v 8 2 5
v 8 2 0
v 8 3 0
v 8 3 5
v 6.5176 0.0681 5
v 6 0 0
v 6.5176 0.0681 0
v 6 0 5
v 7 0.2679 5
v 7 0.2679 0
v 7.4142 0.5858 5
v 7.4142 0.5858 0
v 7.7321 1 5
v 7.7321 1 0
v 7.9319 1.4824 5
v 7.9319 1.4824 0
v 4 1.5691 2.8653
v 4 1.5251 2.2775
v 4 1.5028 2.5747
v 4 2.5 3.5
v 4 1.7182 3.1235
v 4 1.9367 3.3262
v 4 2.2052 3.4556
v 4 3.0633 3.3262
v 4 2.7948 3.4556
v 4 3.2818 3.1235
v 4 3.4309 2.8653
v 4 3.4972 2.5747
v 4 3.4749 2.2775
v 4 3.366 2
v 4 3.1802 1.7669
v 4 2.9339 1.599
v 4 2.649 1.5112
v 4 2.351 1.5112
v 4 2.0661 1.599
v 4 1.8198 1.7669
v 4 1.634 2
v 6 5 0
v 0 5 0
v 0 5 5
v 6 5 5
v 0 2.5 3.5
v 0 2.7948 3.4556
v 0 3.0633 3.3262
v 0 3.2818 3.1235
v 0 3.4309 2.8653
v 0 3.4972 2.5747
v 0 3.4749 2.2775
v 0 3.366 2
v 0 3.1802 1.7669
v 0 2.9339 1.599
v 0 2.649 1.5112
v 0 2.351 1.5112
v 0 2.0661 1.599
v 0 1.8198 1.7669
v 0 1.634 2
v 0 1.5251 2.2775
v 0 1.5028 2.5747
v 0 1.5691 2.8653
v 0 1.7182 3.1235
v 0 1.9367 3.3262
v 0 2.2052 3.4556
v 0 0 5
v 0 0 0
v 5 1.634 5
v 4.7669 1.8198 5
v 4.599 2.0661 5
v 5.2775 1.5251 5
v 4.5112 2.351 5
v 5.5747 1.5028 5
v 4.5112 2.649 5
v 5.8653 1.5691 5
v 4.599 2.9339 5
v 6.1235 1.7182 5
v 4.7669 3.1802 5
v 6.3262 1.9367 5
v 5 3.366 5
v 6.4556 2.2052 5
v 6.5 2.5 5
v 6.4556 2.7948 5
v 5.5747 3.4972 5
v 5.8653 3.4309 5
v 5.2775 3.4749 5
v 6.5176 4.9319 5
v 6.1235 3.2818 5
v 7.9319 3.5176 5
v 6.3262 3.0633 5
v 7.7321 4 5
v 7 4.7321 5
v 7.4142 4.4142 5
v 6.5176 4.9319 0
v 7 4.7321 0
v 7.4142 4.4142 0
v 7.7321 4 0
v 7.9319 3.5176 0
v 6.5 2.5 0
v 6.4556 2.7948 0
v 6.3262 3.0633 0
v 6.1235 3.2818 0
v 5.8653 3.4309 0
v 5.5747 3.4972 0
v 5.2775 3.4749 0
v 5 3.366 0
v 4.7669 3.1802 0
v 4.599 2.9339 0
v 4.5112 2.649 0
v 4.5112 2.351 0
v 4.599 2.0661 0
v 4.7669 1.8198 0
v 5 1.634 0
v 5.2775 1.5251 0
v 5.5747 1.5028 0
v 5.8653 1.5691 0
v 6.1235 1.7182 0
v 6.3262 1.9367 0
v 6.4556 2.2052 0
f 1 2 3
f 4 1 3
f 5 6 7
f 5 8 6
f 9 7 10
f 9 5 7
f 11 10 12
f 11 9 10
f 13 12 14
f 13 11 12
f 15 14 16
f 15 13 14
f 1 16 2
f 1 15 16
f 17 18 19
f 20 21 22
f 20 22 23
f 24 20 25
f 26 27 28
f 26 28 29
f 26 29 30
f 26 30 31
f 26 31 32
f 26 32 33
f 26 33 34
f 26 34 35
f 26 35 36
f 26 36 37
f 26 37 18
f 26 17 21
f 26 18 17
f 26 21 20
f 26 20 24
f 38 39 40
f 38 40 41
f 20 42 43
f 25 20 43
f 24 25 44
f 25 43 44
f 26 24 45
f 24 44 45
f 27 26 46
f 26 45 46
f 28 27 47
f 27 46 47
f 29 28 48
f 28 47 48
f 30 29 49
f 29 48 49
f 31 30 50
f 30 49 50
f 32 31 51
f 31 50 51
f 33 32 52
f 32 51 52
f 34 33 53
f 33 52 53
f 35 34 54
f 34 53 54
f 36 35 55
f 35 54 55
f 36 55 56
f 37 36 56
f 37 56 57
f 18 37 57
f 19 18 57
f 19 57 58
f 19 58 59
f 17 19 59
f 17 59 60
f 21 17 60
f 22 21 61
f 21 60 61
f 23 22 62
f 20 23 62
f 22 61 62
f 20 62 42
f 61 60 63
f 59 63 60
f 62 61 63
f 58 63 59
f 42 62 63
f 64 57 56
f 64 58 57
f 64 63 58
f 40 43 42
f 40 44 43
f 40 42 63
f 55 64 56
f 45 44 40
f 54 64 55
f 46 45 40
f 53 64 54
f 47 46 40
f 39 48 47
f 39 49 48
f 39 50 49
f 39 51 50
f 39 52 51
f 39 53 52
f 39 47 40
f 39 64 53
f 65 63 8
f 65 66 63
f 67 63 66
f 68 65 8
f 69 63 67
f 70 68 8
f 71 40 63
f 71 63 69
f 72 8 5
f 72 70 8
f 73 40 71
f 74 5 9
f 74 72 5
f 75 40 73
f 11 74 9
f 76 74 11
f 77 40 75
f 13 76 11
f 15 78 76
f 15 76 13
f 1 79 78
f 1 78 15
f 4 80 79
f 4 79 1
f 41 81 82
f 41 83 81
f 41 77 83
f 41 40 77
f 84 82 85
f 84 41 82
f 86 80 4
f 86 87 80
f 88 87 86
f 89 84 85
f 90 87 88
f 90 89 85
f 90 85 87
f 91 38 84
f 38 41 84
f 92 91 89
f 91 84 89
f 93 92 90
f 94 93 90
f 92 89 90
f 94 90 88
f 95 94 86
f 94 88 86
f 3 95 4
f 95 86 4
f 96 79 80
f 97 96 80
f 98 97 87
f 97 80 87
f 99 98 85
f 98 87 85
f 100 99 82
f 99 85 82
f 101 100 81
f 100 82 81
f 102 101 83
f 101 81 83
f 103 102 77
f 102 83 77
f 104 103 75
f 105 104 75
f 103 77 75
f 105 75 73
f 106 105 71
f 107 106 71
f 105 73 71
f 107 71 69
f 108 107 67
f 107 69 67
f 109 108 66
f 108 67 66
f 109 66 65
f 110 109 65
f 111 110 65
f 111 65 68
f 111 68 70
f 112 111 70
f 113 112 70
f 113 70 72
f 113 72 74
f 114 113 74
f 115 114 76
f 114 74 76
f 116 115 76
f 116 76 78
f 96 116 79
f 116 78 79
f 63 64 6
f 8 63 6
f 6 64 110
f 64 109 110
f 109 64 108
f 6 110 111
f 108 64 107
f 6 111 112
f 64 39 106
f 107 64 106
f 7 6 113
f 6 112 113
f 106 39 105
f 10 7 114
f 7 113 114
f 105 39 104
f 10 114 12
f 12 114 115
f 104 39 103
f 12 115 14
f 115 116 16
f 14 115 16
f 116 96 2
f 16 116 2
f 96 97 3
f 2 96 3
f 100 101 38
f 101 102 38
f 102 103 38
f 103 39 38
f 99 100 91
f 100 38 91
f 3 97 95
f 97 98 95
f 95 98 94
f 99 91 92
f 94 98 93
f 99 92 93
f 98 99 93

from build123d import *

# Parameters (mm, degrees)
SKETCH1_W           = 8
SKETCH1_H           = 5
BOSS_EXTRUDE1_DEPTH = 5
SKETCH2_R           = 1
CUT_EXTRUDE1_DEPTH  = 4
SKETCH3_R           = 1
CUT_EXTRUDE4_DEPTH  = 5
FILLET1_R           = 2


with BuildPart() as part:
    # Sketch1 → Boss-Extrude1 (new body)
    with BuildSketch(Plane.XY):
        with Locations((4, 2.5)):
            Rectangle(SKETCH1_W, SKETCH1_H)
    extrude(amount=BOSS_EXTRUDE1_DEPTH)

    # Sketch2 → Cut-Extrude1 (cut)
    with BuildSketch(Plane.ZY):
        with Locations((2.5, 2.5)):
            Circle(SKETCH2_R)
    extrude(amount=-CUT_EXTRUDE1_DEPTH, mode=Mode.SUBTRACT)

    # Sketch3 → Cut-Extrude4 (cut)
    with BuildSketch(Plane.XY.offset(5)):
        with Locations((5.5, 2.5)):
            Circle(SKETCH3_R)
    extrude(amount=-CUT_EXTRUDE4_DEPTH, mode=Mode.SUBTRACT)

    # Fillet1
    fillet1_edges = [part.edges().sort_by_distance(p)[0] for p in [
        (8, 5, 2.5),
        (8, 0, 2.5),
    ]]
    fillet(fillet1_edges, radius=FILLET1_R)


solid = part.part
